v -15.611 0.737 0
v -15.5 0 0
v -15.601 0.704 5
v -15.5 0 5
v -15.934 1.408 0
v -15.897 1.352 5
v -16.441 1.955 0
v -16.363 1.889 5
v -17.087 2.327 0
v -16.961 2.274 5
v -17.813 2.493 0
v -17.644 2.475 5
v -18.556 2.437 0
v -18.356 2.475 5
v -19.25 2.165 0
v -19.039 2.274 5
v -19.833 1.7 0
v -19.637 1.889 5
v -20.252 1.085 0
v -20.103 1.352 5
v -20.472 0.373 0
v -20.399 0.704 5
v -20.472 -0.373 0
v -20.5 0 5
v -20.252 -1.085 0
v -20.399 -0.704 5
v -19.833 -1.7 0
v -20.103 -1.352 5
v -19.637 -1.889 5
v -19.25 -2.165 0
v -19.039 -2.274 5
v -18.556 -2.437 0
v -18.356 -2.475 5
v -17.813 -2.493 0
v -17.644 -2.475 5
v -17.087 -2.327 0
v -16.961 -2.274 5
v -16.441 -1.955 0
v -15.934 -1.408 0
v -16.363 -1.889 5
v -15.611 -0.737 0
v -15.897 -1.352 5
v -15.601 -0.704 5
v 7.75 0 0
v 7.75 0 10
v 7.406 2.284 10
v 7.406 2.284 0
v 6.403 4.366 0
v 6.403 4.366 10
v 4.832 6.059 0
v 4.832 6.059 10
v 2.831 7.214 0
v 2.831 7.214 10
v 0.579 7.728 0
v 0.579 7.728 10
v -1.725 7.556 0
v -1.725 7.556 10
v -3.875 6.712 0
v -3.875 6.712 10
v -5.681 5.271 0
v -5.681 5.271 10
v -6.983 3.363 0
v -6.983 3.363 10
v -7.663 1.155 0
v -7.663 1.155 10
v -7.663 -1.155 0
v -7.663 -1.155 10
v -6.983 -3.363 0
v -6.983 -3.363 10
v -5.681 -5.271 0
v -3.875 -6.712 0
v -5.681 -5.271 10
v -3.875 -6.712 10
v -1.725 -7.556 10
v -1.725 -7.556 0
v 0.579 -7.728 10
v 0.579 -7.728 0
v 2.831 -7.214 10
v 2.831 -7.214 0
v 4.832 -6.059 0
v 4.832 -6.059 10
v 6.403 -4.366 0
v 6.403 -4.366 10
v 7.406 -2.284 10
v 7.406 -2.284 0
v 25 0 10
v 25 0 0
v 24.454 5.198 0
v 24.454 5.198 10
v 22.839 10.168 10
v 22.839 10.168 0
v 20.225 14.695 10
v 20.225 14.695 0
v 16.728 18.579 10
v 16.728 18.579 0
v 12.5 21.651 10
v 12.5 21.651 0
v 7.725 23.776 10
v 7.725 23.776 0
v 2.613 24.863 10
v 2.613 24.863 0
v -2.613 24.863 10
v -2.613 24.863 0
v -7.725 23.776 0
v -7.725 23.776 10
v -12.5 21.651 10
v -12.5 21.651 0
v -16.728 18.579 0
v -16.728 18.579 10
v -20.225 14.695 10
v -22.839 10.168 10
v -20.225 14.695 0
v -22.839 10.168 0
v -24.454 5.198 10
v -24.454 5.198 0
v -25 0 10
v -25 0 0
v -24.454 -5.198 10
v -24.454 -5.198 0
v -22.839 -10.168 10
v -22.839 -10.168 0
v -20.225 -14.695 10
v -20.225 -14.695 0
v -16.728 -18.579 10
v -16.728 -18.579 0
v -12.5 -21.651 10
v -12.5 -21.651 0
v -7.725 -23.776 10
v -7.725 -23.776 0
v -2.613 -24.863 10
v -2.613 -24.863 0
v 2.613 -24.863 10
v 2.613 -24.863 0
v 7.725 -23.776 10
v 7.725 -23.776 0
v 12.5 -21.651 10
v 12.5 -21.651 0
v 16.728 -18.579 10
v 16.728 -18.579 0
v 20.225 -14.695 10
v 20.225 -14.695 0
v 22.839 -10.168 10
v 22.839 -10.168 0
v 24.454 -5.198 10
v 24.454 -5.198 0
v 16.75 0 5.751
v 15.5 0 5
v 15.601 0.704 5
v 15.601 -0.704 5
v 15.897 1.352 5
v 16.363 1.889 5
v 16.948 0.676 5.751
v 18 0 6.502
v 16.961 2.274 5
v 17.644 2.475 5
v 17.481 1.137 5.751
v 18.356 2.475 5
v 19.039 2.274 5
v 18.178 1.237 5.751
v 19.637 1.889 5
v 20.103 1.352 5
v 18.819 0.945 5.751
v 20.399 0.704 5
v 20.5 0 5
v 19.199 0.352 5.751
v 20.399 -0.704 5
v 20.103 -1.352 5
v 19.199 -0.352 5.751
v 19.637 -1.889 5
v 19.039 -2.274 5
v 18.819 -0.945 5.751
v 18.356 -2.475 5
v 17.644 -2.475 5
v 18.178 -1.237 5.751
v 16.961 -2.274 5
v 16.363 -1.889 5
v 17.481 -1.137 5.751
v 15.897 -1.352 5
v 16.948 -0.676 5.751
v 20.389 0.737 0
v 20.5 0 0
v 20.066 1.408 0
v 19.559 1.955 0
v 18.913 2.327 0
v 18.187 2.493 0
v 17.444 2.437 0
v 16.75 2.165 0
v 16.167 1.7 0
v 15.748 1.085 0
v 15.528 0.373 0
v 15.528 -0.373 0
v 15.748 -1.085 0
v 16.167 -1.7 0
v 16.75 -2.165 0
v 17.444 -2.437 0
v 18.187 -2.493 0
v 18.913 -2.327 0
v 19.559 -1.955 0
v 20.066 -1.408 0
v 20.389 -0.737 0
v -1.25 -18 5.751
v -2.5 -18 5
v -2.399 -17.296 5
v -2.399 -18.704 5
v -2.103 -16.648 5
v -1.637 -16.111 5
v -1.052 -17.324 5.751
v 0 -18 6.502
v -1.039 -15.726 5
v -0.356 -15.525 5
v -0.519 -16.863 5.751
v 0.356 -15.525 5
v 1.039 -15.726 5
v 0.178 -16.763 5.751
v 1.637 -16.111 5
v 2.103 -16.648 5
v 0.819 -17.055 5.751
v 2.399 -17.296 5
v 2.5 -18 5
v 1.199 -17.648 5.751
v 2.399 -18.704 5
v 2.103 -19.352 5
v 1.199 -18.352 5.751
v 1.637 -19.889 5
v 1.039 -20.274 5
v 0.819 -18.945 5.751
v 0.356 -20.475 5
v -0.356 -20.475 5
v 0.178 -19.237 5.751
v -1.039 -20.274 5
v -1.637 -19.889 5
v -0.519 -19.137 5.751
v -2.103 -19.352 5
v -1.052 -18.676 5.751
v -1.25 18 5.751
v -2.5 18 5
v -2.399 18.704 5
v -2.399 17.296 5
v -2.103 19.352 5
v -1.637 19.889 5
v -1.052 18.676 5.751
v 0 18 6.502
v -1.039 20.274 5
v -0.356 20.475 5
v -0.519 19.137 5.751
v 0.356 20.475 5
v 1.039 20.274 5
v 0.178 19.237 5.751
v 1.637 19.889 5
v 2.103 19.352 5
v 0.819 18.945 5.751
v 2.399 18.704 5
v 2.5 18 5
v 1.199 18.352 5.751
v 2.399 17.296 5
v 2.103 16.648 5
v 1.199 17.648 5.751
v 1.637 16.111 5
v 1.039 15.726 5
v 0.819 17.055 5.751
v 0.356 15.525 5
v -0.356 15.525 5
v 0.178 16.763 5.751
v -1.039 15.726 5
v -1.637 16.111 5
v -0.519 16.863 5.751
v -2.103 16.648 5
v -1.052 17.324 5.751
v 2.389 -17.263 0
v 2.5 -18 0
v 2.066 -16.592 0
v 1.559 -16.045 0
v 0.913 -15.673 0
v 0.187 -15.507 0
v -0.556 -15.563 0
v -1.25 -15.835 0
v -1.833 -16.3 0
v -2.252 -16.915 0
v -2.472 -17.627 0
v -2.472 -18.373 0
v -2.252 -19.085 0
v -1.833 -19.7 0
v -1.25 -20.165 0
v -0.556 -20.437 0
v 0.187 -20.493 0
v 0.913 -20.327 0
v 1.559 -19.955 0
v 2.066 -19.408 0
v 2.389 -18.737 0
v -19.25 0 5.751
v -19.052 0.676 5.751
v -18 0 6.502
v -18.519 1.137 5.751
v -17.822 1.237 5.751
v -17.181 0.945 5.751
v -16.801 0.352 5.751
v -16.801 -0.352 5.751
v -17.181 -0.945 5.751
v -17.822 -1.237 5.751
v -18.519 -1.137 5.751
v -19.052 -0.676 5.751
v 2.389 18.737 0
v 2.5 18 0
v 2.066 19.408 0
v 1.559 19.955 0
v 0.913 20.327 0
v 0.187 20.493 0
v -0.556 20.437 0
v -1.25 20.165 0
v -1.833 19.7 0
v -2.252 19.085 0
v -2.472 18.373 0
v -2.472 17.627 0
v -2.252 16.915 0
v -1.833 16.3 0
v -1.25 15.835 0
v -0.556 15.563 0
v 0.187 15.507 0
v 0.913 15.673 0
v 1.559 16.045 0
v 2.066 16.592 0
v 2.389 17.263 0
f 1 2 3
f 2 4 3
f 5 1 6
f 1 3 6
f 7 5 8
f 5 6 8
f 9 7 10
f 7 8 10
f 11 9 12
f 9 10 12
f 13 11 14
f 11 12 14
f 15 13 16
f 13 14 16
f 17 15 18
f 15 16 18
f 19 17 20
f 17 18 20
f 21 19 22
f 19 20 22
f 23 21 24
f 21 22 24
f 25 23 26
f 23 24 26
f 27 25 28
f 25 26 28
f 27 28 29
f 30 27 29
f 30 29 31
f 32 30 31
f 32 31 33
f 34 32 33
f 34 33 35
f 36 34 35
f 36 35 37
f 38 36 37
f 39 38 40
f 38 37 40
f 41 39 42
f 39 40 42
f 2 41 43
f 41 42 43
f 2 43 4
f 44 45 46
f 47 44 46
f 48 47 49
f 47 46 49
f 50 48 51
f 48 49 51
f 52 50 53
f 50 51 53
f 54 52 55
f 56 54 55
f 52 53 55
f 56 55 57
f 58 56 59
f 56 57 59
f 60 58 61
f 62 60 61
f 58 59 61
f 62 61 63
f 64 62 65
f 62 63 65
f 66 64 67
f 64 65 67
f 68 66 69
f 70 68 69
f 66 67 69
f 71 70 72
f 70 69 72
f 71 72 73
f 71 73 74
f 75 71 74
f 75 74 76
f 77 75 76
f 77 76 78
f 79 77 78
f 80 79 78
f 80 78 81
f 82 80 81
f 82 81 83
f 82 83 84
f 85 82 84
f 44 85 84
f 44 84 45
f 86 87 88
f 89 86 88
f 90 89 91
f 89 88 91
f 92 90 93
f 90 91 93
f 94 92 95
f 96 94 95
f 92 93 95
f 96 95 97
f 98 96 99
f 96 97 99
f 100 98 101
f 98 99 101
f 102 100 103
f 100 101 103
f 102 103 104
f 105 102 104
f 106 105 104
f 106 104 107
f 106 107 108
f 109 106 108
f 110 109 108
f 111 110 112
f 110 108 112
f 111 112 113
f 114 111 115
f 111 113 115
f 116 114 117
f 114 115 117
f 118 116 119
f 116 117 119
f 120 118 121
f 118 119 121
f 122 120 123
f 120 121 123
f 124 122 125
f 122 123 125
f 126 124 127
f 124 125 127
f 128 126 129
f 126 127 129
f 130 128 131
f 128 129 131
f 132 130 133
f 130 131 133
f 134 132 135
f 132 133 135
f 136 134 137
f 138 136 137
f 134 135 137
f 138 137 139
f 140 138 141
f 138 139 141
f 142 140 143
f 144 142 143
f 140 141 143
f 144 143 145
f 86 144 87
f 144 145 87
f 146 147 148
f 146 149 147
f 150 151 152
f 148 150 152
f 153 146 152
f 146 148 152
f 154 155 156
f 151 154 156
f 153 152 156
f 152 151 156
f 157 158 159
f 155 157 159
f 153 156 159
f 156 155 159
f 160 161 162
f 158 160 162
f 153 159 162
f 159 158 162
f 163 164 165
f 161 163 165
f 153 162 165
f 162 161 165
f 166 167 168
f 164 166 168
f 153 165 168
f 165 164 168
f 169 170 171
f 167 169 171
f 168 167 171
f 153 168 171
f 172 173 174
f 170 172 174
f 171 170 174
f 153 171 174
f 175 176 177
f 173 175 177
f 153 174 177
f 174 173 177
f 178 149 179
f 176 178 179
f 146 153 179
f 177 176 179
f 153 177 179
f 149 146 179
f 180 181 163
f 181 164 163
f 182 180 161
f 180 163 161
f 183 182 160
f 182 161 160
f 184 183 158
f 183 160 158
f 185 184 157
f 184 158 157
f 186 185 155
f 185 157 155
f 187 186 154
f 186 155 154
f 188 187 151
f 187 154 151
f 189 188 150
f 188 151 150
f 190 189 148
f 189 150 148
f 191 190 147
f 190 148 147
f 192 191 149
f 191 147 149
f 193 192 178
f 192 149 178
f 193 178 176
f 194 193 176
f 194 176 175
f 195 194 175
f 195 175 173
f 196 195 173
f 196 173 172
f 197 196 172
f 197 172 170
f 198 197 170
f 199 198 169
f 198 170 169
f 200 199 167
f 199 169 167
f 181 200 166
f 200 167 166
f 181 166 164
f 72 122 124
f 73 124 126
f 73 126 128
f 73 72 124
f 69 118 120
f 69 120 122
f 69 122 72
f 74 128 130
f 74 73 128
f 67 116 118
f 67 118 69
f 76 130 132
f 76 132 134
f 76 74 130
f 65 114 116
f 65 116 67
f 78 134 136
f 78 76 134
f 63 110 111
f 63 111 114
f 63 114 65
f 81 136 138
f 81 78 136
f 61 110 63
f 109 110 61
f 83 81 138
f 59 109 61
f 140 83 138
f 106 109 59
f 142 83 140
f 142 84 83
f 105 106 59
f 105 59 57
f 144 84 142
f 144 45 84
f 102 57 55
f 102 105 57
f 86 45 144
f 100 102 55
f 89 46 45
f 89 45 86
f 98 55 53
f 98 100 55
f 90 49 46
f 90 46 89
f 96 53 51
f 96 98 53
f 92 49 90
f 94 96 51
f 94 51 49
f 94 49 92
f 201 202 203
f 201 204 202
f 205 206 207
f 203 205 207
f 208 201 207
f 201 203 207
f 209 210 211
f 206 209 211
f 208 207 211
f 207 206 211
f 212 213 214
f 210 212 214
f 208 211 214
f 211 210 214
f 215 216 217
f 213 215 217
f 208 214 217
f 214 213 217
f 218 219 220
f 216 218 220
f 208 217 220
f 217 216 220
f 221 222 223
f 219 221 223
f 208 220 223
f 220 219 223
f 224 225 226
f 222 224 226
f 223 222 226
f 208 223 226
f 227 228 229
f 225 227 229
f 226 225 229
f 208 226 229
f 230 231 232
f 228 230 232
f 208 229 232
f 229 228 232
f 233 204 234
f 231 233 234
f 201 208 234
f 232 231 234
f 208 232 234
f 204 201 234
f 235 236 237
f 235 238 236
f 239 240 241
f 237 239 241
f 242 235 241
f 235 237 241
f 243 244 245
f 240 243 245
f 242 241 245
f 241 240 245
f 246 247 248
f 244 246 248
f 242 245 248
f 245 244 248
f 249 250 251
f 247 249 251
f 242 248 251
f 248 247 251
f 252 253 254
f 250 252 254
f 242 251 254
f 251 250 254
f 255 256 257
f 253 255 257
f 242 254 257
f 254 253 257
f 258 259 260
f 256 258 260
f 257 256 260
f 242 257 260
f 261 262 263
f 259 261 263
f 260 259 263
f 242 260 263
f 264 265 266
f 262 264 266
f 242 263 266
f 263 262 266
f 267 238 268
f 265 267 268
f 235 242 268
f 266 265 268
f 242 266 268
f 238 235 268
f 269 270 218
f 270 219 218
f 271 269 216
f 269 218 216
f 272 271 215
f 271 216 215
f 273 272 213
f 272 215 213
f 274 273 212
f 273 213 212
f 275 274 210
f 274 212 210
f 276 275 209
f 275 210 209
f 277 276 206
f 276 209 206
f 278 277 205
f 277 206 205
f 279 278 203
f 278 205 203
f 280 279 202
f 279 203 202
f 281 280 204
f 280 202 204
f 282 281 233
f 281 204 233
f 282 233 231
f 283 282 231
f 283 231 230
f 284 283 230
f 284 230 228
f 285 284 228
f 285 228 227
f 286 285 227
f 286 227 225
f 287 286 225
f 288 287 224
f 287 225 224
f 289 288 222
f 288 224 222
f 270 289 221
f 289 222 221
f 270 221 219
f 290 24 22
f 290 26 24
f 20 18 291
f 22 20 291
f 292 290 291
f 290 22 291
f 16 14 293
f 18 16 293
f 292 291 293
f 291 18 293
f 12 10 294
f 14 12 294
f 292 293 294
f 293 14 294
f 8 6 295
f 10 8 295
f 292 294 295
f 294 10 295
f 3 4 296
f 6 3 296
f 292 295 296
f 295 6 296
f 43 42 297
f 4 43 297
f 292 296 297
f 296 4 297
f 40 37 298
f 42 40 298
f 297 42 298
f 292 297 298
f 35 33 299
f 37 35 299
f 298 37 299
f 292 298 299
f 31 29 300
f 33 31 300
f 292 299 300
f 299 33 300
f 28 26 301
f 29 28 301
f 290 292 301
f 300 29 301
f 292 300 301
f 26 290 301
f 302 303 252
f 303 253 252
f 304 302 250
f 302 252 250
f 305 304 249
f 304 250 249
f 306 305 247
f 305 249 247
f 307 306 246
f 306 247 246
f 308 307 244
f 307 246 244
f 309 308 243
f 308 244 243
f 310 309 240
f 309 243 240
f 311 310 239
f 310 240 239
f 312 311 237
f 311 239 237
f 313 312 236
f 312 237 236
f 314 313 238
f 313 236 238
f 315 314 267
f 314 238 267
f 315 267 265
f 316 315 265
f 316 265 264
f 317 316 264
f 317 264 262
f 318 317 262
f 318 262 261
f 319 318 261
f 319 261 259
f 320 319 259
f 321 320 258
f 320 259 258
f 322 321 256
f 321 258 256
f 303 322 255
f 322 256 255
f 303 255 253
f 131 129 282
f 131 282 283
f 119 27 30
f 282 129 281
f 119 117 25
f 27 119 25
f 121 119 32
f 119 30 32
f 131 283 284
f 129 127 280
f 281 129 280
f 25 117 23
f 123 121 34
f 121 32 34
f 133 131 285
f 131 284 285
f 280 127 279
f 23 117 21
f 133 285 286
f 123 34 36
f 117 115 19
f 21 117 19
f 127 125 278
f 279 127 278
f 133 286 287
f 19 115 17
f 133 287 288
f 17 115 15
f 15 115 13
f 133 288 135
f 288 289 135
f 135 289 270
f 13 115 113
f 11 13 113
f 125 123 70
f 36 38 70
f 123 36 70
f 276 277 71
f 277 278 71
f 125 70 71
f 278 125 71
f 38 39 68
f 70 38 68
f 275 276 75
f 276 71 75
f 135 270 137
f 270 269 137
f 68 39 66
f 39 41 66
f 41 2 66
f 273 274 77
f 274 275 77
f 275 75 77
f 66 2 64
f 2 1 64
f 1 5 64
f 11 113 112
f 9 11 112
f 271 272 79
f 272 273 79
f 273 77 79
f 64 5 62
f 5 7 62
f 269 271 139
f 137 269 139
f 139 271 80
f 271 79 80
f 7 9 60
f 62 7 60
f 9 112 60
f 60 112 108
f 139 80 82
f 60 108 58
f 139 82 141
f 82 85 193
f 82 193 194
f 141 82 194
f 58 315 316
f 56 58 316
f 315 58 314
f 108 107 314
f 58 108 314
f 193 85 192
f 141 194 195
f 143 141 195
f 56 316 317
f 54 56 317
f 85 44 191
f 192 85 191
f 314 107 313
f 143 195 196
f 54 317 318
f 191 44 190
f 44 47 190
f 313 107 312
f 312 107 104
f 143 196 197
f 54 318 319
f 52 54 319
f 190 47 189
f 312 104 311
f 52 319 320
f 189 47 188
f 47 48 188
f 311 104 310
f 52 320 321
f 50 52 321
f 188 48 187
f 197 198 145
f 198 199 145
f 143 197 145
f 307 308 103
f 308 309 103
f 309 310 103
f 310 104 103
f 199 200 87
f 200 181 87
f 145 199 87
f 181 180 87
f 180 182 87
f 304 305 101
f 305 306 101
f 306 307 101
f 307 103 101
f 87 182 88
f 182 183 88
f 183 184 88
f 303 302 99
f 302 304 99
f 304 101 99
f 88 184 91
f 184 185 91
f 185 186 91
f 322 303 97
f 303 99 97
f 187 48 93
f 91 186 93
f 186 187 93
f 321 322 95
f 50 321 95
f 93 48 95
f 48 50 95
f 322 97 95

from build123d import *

# Parameters (mm, degrees)
SKETCH_1_R              = 25
EXTRUDE_1_DEPTH         = 10
HOLE_WIZARD_M18_1_D     = 15.5
HOLE_WIZARD_M18_1_DEPTH = 43.5
HOLE_WIZARD_M18_1_TIP   = 4.656669797
HOLE_WIZARD_M6_1_D      = 5
HOLE_WIZARD_M6_1_DEPTH  = 5
HOLE_WIZARD_M6_1_TIP    = 1.502151548


with BuildPart() as part:
    # 草图1 → 凸台-拉伸1 (new body)
    with BuildSketch(Plane.XY):
        Circle(SKETCH_1_R)
    extrude(amount=EXTRUDE_1_DEPTH)

    # M18 螺纹孔1
    with Locations(Plane(origin=(0, 0, 0), x_dir=(-1, 0, 0), z_dir=(0, 0, -1))):
        with Locations((0, 0)):
            Hole(HOLE_WIZARD_M18_1_D / 2, depth=HOLE_WIZARD_M18_1_DEPTH)
            with Locations((0, 0, -(HOLE_WIZARD_M18_1_DEPTH + HOLE_WIZARD_M18_1_TIP / 2))):  # 118° drill point
                Cone(0, HOLE_WIZARD_M18_1_D / 2, HOLE_WIZARD_M18_1_TIP, mode=Mode.SUBTRACT)

    # M6 螺纹孔1
    with Locations(Plane(origin=(0, 0, 0), x_dir=(-1, 0, 0), z_dir=(0, 0, -1))):
        with Locations((0, 18), (-18, 0), (18, 0), (0, -18)):
            Hole(HOLE_WIZARD_M6_1_D / 2, depth=HOLE_WIZARD_M6_1_DEPTH)
            with Locations((0, 0, -(HOLE_WIZARD_M6_1_DEPTH + HOLE_WIZARD_M6_1_TIP / 2))):  # 118° drill point
                Cone(0, HOLE_WIZARD_M6_1_D / 2, HOLE_WIZARD_M6_1_TIP, mode=Mode.SUBTRACT)


solid = part.part
